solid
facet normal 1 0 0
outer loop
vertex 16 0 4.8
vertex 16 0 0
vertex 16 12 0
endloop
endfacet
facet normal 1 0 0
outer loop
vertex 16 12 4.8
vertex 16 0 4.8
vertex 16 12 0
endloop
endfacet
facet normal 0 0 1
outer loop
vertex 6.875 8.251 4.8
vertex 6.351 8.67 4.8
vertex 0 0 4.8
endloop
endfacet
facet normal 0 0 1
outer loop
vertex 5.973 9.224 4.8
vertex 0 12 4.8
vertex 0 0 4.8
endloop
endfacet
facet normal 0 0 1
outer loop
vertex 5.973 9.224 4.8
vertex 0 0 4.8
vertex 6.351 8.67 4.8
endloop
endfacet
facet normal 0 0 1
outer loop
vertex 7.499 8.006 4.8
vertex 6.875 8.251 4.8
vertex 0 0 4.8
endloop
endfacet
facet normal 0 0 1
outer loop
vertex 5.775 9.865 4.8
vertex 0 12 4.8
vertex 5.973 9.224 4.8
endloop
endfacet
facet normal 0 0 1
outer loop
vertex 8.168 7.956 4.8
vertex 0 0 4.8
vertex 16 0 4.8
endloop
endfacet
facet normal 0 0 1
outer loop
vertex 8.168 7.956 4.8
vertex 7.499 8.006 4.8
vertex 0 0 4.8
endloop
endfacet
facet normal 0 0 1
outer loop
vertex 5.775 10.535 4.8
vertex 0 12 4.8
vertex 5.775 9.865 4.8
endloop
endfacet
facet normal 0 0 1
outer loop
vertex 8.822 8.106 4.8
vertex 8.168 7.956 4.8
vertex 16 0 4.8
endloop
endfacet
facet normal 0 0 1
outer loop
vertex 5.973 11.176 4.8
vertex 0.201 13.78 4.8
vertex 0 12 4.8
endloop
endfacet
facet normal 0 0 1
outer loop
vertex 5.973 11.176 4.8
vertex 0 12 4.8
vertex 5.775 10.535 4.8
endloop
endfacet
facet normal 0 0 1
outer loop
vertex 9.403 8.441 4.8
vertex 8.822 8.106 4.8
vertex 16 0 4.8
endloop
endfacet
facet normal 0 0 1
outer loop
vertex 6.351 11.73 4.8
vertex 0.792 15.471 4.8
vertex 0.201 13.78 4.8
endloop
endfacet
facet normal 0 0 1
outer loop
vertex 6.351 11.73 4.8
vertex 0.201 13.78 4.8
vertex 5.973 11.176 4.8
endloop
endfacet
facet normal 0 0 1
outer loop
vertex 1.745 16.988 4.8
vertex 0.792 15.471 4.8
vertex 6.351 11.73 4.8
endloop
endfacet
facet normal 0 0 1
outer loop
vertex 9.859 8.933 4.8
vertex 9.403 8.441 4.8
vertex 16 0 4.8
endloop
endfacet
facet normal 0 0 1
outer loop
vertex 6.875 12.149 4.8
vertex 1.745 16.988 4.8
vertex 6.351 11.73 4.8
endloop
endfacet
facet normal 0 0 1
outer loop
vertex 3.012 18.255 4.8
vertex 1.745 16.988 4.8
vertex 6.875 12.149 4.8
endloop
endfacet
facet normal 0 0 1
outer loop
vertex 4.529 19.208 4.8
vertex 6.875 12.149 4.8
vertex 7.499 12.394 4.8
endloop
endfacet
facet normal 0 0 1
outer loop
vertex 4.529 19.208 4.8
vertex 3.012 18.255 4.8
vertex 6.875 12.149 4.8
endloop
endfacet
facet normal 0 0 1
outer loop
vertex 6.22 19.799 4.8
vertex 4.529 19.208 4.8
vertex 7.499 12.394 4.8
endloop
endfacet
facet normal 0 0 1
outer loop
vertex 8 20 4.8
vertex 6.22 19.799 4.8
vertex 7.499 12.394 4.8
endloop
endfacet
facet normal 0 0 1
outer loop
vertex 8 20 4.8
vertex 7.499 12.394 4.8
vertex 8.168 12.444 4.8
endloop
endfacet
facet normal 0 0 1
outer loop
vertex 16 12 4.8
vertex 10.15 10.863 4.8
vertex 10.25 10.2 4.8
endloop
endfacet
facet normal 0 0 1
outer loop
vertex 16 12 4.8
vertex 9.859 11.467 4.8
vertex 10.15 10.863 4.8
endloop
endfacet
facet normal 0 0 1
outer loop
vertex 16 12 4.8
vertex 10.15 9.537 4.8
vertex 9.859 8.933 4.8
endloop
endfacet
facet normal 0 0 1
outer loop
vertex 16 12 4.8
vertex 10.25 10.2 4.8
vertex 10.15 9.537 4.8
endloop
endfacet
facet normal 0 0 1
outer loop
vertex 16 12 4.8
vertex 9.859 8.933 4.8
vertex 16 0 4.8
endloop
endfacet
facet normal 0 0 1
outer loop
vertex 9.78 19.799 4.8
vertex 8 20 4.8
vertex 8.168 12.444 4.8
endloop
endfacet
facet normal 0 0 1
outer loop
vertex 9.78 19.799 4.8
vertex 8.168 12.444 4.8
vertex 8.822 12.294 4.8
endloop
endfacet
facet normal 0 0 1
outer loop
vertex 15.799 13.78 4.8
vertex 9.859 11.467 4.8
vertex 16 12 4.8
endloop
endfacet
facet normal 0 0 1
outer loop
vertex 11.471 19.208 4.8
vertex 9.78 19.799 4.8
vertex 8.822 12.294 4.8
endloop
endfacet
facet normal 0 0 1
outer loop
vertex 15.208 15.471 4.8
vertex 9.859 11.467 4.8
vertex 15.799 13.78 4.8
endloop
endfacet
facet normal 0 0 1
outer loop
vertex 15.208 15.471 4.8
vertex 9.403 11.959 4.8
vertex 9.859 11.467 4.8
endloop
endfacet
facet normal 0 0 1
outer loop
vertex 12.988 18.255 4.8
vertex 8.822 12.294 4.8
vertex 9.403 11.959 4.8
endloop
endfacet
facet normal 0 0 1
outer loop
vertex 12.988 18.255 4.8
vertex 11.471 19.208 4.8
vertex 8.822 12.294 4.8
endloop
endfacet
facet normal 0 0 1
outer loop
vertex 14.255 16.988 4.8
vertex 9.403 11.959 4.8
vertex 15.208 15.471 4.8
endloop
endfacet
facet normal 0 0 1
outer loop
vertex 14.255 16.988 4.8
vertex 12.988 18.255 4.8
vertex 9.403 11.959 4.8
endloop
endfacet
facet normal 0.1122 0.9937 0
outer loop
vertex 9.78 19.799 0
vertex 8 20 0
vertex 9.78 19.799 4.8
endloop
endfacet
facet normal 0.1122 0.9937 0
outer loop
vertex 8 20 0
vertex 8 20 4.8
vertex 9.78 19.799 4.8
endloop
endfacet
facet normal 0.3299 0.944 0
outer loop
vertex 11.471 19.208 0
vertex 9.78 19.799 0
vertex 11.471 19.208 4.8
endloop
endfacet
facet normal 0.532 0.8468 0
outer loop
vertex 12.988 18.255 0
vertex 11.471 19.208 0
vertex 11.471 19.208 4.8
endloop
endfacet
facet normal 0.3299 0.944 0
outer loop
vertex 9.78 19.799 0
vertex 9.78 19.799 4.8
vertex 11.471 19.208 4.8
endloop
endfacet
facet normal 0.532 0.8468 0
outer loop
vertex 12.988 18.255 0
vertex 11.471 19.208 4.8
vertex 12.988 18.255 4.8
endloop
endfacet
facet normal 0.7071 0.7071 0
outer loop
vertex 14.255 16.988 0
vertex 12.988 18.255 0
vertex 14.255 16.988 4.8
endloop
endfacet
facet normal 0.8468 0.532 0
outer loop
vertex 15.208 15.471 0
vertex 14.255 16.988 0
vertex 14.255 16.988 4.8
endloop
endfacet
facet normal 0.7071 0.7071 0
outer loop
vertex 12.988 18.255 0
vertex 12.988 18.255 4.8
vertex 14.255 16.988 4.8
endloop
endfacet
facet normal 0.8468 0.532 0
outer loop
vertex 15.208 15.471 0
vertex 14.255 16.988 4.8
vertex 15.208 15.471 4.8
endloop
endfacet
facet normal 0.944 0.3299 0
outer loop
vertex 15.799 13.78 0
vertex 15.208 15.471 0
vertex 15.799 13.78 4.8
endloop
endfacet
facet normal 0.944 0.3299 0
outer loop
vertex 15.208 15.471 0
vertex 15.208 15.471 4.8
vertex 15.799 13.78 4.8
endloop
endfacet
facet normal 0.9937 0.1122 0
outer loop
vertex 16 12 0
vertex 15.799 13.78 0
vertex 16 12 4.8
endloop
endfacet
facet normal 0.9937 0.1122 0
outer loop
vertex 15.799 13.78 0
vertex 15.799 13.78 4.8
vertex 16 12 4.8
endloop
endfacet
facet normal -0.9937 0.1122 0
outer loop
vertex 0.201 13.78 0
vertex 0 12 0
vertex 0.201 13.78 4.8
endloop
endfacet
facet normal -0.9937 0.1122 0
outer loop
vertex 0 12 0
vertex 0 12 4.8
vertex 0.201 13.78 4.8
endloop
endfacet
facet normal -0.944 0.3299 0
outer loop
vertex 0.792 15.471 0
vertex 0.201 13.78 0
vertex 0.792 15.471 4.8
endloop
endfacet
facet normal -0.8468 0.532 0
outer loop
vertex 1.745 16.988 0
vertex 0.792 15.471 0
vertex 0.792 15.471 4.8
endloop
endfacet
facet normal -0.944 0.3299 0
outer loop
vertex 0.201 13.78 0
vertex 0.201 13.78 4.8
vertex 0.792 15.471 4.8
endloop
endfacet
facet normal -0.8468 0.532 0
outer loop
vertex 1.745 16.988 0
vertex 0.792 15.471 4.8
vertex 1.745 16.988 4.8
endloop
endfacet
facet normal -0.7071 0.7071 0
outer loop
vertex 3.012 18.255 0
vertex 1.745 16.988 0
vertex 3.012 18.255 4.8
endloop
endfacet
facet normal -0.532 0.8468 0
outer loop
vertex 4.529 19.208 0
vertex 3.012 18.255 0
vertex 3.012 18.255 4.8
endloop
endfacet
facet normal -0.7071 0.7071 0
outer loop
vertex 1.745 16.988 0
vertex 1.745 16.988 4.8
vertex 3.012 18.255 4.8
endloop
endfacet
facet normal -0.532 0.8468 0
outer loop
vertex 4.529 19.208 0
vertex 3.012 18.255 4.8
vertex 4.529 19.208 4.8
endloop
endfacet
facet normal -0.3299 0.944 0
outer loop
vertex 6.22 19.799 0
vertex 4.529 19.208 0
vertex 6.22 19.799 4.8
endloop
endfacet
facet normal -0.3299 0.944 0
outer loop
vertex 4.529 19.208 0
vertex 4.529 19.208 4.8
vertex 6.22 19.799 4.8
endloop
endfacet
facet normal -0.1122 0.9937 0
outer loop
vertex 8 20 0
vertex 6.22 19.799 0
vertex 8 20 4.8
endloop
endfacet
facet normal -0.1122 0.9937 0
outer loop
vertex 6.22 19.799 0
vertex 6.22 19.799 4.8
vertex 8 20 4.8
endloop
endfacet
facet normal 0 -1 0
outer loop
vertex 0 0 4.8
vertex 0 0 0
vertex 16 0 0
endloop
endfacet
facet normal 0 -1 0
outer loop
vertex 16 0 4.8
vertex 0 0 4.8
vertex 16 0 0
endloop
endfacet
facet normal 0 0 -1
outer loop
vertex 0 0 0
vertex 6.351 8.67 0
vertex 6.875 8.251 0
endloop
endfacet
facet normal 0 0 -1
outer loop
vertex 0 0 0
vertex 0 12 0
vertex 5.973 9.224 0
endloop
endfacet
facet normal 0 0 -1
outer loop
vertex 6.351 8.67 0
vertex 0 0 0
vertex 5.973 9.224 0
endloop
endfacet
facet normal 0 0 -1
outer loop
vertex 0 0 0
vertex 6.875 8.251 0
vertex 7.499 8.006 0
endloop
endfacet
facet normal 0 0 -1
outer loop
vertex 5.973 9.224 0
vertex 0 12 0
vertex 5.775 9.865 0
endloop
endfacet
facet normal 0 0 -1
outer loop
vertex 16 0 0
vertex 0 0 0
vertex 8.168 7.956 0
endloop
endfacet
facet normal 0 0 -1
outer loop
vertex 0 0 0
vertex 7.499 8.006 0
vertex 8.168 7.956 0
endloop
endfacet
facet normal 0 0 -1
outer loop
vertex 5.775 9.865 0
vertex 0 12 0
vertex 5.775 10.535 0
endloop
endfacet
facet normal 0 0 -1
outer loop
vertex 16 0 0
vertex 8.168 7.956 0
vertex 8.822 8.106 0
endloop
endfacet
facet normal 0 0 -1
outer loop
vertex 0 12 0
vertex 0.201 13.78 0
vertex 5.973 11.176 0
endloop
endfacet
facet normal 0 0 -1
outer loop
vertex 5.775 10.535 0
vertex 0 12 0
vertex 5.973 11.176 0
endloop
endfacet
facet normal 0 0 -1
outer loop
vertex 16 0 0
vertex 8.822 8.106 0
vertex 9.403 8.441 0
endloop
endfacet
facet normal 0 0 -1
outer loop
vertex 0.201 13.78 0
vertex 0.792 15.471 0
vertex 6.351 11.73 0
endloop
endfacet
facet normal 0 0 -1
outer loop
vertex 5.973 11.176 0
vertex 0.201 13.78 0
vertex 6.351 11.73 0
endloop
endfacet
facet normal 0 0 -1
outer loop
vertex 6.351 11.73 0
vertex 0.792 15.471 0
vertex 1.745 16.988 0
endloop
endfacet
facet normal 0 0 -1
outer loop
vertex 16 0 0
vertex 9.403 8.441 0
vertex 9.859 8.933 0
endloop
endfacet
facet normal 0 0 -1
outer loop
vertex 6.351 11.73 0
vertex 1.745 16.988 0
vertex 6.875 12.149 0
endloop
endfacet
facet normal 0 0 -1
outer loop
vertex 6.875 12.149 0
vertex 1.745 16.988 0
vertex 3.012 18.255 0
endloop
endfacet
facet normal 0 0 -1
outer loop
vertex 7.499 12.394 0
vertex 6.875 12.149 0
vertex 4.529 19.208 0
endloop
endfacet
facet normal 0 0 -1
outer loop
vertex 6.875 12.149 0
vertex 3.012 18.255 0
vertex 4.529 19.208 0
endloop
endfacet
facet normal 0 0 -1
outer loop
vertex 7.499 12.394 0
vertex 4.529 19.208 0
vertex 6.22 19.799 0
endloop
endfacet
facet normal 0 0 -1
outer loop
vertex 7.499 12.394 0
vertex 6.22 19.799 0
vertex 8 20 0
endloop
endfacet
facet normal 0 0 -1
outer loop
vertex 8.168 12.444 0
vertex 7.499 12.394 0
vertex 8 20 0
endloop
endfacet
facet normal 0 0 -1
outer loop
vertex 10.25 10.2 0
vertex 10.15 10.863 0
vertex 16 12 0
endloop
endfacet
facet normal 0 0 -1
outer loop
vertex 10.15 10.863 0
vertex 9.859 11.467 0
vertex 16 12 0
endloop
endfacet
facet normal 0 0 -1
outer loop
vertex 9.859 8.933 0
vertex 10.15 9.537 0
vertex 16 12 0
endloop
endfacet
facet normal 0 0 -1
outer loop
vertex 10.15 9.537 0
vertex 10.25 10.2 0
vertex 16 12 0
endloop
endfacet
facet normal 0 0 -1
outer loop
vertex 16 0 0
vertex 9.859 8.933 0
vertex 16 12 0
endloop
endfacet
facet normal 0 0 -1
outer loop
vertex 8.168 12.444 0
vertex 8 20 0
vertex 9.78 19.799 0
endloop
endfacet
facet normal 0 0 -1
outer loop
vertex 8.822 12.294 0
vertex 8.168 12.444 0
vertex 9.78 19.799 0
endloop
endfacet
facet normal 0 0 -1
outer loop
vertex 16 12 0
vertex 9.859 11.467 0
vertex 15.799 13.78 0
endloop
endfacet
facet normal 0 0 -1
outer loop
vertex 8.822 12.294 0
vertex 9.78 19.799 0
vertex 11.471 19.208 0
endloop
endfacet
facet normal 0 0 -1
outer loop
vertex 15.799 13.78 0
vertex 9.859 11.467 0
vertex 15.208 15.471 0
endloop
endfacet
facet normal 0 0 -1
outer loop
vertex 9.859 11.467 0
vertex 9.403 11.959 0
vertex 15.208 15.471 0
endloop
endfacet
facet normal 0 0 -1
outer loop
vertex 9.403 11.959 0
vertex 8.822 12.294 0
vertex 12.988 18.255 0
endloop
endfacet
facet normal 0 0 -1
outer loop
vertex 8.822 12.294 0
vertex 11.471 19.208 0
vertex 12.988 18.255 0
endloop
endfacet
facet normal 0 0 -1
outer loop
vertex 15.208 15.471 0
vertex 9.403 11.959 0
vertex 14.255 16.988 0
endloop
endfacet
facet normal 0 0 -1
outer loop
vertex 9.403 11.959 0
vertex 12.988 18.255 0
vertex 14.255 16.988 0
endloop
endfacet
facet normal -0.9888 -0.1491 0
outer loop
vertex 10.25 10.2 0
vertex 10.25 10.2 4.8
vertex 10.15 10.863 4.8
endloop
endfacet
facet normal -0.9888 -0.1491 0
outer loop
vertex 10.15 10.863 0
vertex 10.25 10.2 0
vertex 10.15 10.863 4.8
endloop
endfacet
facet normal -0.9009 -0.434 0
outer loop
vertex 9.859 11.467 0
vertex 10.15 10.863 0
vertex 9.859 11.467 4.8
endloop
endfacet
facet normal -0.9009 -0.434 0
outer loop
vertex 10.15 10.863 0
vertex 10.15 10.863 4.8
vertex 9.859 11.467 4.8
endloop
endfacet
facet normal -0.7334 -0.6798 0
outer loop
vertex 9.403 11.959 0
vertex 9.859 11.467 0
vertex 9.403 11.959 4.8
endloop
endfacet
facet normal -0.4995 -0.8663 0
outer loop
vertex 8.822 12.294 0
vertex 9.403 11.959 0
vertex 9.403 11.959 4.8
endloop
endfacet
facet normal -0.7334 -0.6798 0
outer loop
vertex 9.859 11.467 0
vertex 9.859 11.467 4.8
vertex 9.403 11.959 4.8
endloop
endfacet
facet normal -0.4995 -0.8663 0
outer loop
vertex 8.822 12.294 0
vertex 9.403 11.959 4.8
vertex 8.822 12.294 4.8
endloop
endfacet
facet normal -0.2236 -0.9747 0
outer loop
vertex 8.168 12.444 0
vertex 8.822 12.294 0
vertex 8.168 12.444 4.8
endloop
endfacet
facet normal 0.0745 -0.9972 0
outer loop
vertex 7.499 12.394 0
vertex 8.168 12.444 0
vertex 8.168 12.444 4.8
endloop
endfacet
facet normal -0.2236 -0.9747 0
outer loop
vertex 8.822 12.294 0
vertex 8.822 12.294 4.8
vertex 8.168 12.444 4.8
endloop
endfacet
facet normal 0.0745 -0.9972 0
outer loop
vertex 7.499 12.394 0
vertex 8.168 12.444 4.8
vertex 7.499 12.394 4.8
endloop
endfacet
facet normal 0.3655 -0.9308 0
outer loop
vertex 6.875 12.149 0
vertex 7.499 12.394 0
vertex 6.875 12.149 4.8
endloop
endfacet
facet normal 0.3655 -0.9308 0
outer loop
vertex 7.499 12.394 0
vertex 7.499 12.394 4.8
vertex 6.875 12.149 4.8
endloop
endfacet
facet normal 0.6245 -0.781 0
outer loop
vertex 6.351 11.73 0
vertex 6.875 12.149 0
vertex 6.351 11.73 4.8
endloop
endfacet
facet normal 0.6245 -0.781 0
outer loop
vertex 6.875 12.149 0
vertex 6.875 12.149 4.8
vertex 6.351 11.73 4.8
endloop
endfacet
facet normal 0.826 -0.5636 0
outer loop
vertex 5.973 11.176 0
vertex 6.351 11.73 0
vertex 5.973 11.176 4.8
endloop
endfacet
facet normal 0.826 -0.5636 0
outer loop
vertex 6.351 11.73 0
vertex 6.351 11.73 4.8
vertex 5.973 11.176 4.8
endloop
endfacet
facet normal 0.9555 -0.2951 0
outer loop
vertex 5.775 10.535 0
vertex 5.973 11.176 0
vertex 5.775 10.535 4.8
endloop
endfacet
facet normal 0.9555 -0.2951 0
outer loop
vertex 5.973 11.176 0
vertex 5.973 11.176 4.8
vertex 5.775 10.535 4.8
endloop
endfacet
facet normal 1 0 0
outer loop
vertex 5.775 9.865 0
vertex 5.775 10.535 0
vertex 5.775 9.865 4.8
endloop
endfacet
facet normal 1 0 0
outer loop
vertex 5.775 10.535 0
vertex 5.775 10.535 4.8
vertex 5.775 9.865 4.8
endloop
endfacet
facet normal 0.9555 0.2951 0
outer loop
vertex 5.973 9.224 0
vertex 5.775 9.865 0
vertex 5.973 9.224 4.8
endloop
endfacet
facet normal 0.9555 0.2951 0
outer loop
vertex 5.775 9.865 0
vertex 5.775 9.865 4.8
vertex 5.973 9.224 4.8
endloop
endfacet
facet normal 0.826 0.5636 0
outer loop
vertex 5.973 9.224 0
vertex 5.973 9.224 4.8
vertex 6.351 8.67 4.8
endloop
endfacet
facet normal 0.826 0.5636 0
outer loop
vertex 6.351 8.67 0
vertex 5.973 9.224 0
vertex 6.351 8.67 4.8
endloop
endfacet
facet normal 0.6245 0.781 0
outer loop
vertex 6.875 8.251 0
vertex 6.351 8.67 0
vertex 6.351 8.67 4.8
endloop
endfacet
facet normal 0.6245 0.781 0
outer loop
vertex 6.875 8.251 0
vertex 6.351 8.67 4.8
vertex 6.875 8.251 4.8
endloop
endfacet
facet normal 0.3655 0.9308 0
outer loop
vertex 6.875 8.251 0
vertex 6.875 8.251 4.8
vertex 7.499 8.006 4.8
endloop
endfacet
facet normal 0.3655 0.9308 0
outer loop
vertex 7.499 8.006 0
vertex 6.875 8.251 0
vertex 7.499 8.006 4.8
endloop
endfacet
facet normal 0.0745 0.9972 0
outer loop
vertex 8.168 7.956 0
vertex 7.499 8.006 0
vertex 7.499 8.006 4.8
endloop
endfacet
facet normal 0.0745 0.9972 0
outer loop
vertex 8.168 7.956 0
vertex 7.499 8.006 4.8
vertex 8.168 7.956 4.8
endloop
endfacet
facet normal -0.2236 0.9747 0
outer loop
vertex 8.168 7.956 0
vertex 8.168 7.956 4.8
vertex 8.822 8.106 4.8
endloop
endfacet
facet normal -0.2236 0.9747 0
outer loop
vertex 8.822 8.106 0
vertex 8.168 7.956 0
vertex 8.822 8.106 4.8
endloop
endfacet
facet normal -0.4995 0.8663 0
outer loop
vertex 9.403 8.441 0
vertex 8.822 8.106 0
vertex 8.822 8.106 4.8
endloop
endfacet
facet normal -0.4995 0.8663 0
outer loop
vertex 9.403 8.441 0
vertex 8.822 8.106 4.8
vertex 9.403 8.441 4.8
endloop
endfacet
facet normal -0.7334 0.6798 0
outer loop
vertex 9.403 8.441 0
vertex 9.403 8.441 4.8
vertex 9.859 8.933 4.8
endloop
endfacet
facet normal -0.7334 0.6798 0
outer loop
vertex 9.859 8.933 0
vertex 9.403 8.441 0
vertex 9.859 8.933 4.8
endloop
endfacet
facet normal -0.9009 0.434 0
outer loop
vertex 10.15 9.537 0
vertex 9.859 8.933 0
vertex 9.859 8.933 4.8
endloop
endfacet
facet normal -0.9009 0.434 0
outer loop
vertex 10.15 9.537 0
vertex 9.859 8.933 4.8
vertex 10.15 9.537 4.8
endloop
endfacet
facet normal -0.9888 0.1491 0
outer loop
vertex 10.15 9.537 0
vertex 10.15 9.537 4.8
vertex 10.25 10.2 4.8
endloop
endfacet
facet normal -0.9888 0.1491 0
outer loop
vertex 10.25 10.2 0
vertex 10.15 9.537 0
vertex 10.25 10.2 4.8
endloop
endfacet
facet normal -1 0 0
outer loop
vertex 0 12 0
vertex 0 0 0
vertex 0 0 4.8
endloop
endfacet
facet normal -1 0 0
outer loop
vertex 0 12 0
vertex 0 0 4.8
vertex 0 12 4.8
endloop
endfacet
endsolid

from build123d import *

# Parameters (mm, degrees)
SKETCH1_W           = 16
SKETCH1_H           = 20
BOSS_EXTRUDE1_DEPTH = 4.8
SKETCH2_R           = 2.25
CUT_EXTRUDE1_DEPTH  = 27.05839596
FILLET1_R           = 8


with BuildPart() as part:
    # Sketch1 → Boss-Extrude1 (new body)
    with BuildSketch(Plane.XY):
        with Locations((8, 10)):
            Rectangle(SKETCH1_W, SKETCH1_H)
    extrude(amount=BOSS_EXTRUDE1_DEPTH)

    # Sketch2 → Cut-Extrude1 (cut, through all)
    with BuildSketch(Plane.XY.offset(4.8)):
        with Locations((8, 10.2)):
            Circle(SKETCH2_R)
    extrude(amount=-CUT_EXTRUDE1_DEPTH, mode=Mode.SUBTRACT)

    # Fillet1
    fillet1_edges = [part.edges().sort_by_distance(p)[0] for p in [
        (16, 20, 2.4),
        (0, 20, 2.4),
    ]]
    fillet(fillet1_edges, radius=FILLET1_R - 0.0001)  # a hair under: the kernel refuses the full size


solid = part.part
